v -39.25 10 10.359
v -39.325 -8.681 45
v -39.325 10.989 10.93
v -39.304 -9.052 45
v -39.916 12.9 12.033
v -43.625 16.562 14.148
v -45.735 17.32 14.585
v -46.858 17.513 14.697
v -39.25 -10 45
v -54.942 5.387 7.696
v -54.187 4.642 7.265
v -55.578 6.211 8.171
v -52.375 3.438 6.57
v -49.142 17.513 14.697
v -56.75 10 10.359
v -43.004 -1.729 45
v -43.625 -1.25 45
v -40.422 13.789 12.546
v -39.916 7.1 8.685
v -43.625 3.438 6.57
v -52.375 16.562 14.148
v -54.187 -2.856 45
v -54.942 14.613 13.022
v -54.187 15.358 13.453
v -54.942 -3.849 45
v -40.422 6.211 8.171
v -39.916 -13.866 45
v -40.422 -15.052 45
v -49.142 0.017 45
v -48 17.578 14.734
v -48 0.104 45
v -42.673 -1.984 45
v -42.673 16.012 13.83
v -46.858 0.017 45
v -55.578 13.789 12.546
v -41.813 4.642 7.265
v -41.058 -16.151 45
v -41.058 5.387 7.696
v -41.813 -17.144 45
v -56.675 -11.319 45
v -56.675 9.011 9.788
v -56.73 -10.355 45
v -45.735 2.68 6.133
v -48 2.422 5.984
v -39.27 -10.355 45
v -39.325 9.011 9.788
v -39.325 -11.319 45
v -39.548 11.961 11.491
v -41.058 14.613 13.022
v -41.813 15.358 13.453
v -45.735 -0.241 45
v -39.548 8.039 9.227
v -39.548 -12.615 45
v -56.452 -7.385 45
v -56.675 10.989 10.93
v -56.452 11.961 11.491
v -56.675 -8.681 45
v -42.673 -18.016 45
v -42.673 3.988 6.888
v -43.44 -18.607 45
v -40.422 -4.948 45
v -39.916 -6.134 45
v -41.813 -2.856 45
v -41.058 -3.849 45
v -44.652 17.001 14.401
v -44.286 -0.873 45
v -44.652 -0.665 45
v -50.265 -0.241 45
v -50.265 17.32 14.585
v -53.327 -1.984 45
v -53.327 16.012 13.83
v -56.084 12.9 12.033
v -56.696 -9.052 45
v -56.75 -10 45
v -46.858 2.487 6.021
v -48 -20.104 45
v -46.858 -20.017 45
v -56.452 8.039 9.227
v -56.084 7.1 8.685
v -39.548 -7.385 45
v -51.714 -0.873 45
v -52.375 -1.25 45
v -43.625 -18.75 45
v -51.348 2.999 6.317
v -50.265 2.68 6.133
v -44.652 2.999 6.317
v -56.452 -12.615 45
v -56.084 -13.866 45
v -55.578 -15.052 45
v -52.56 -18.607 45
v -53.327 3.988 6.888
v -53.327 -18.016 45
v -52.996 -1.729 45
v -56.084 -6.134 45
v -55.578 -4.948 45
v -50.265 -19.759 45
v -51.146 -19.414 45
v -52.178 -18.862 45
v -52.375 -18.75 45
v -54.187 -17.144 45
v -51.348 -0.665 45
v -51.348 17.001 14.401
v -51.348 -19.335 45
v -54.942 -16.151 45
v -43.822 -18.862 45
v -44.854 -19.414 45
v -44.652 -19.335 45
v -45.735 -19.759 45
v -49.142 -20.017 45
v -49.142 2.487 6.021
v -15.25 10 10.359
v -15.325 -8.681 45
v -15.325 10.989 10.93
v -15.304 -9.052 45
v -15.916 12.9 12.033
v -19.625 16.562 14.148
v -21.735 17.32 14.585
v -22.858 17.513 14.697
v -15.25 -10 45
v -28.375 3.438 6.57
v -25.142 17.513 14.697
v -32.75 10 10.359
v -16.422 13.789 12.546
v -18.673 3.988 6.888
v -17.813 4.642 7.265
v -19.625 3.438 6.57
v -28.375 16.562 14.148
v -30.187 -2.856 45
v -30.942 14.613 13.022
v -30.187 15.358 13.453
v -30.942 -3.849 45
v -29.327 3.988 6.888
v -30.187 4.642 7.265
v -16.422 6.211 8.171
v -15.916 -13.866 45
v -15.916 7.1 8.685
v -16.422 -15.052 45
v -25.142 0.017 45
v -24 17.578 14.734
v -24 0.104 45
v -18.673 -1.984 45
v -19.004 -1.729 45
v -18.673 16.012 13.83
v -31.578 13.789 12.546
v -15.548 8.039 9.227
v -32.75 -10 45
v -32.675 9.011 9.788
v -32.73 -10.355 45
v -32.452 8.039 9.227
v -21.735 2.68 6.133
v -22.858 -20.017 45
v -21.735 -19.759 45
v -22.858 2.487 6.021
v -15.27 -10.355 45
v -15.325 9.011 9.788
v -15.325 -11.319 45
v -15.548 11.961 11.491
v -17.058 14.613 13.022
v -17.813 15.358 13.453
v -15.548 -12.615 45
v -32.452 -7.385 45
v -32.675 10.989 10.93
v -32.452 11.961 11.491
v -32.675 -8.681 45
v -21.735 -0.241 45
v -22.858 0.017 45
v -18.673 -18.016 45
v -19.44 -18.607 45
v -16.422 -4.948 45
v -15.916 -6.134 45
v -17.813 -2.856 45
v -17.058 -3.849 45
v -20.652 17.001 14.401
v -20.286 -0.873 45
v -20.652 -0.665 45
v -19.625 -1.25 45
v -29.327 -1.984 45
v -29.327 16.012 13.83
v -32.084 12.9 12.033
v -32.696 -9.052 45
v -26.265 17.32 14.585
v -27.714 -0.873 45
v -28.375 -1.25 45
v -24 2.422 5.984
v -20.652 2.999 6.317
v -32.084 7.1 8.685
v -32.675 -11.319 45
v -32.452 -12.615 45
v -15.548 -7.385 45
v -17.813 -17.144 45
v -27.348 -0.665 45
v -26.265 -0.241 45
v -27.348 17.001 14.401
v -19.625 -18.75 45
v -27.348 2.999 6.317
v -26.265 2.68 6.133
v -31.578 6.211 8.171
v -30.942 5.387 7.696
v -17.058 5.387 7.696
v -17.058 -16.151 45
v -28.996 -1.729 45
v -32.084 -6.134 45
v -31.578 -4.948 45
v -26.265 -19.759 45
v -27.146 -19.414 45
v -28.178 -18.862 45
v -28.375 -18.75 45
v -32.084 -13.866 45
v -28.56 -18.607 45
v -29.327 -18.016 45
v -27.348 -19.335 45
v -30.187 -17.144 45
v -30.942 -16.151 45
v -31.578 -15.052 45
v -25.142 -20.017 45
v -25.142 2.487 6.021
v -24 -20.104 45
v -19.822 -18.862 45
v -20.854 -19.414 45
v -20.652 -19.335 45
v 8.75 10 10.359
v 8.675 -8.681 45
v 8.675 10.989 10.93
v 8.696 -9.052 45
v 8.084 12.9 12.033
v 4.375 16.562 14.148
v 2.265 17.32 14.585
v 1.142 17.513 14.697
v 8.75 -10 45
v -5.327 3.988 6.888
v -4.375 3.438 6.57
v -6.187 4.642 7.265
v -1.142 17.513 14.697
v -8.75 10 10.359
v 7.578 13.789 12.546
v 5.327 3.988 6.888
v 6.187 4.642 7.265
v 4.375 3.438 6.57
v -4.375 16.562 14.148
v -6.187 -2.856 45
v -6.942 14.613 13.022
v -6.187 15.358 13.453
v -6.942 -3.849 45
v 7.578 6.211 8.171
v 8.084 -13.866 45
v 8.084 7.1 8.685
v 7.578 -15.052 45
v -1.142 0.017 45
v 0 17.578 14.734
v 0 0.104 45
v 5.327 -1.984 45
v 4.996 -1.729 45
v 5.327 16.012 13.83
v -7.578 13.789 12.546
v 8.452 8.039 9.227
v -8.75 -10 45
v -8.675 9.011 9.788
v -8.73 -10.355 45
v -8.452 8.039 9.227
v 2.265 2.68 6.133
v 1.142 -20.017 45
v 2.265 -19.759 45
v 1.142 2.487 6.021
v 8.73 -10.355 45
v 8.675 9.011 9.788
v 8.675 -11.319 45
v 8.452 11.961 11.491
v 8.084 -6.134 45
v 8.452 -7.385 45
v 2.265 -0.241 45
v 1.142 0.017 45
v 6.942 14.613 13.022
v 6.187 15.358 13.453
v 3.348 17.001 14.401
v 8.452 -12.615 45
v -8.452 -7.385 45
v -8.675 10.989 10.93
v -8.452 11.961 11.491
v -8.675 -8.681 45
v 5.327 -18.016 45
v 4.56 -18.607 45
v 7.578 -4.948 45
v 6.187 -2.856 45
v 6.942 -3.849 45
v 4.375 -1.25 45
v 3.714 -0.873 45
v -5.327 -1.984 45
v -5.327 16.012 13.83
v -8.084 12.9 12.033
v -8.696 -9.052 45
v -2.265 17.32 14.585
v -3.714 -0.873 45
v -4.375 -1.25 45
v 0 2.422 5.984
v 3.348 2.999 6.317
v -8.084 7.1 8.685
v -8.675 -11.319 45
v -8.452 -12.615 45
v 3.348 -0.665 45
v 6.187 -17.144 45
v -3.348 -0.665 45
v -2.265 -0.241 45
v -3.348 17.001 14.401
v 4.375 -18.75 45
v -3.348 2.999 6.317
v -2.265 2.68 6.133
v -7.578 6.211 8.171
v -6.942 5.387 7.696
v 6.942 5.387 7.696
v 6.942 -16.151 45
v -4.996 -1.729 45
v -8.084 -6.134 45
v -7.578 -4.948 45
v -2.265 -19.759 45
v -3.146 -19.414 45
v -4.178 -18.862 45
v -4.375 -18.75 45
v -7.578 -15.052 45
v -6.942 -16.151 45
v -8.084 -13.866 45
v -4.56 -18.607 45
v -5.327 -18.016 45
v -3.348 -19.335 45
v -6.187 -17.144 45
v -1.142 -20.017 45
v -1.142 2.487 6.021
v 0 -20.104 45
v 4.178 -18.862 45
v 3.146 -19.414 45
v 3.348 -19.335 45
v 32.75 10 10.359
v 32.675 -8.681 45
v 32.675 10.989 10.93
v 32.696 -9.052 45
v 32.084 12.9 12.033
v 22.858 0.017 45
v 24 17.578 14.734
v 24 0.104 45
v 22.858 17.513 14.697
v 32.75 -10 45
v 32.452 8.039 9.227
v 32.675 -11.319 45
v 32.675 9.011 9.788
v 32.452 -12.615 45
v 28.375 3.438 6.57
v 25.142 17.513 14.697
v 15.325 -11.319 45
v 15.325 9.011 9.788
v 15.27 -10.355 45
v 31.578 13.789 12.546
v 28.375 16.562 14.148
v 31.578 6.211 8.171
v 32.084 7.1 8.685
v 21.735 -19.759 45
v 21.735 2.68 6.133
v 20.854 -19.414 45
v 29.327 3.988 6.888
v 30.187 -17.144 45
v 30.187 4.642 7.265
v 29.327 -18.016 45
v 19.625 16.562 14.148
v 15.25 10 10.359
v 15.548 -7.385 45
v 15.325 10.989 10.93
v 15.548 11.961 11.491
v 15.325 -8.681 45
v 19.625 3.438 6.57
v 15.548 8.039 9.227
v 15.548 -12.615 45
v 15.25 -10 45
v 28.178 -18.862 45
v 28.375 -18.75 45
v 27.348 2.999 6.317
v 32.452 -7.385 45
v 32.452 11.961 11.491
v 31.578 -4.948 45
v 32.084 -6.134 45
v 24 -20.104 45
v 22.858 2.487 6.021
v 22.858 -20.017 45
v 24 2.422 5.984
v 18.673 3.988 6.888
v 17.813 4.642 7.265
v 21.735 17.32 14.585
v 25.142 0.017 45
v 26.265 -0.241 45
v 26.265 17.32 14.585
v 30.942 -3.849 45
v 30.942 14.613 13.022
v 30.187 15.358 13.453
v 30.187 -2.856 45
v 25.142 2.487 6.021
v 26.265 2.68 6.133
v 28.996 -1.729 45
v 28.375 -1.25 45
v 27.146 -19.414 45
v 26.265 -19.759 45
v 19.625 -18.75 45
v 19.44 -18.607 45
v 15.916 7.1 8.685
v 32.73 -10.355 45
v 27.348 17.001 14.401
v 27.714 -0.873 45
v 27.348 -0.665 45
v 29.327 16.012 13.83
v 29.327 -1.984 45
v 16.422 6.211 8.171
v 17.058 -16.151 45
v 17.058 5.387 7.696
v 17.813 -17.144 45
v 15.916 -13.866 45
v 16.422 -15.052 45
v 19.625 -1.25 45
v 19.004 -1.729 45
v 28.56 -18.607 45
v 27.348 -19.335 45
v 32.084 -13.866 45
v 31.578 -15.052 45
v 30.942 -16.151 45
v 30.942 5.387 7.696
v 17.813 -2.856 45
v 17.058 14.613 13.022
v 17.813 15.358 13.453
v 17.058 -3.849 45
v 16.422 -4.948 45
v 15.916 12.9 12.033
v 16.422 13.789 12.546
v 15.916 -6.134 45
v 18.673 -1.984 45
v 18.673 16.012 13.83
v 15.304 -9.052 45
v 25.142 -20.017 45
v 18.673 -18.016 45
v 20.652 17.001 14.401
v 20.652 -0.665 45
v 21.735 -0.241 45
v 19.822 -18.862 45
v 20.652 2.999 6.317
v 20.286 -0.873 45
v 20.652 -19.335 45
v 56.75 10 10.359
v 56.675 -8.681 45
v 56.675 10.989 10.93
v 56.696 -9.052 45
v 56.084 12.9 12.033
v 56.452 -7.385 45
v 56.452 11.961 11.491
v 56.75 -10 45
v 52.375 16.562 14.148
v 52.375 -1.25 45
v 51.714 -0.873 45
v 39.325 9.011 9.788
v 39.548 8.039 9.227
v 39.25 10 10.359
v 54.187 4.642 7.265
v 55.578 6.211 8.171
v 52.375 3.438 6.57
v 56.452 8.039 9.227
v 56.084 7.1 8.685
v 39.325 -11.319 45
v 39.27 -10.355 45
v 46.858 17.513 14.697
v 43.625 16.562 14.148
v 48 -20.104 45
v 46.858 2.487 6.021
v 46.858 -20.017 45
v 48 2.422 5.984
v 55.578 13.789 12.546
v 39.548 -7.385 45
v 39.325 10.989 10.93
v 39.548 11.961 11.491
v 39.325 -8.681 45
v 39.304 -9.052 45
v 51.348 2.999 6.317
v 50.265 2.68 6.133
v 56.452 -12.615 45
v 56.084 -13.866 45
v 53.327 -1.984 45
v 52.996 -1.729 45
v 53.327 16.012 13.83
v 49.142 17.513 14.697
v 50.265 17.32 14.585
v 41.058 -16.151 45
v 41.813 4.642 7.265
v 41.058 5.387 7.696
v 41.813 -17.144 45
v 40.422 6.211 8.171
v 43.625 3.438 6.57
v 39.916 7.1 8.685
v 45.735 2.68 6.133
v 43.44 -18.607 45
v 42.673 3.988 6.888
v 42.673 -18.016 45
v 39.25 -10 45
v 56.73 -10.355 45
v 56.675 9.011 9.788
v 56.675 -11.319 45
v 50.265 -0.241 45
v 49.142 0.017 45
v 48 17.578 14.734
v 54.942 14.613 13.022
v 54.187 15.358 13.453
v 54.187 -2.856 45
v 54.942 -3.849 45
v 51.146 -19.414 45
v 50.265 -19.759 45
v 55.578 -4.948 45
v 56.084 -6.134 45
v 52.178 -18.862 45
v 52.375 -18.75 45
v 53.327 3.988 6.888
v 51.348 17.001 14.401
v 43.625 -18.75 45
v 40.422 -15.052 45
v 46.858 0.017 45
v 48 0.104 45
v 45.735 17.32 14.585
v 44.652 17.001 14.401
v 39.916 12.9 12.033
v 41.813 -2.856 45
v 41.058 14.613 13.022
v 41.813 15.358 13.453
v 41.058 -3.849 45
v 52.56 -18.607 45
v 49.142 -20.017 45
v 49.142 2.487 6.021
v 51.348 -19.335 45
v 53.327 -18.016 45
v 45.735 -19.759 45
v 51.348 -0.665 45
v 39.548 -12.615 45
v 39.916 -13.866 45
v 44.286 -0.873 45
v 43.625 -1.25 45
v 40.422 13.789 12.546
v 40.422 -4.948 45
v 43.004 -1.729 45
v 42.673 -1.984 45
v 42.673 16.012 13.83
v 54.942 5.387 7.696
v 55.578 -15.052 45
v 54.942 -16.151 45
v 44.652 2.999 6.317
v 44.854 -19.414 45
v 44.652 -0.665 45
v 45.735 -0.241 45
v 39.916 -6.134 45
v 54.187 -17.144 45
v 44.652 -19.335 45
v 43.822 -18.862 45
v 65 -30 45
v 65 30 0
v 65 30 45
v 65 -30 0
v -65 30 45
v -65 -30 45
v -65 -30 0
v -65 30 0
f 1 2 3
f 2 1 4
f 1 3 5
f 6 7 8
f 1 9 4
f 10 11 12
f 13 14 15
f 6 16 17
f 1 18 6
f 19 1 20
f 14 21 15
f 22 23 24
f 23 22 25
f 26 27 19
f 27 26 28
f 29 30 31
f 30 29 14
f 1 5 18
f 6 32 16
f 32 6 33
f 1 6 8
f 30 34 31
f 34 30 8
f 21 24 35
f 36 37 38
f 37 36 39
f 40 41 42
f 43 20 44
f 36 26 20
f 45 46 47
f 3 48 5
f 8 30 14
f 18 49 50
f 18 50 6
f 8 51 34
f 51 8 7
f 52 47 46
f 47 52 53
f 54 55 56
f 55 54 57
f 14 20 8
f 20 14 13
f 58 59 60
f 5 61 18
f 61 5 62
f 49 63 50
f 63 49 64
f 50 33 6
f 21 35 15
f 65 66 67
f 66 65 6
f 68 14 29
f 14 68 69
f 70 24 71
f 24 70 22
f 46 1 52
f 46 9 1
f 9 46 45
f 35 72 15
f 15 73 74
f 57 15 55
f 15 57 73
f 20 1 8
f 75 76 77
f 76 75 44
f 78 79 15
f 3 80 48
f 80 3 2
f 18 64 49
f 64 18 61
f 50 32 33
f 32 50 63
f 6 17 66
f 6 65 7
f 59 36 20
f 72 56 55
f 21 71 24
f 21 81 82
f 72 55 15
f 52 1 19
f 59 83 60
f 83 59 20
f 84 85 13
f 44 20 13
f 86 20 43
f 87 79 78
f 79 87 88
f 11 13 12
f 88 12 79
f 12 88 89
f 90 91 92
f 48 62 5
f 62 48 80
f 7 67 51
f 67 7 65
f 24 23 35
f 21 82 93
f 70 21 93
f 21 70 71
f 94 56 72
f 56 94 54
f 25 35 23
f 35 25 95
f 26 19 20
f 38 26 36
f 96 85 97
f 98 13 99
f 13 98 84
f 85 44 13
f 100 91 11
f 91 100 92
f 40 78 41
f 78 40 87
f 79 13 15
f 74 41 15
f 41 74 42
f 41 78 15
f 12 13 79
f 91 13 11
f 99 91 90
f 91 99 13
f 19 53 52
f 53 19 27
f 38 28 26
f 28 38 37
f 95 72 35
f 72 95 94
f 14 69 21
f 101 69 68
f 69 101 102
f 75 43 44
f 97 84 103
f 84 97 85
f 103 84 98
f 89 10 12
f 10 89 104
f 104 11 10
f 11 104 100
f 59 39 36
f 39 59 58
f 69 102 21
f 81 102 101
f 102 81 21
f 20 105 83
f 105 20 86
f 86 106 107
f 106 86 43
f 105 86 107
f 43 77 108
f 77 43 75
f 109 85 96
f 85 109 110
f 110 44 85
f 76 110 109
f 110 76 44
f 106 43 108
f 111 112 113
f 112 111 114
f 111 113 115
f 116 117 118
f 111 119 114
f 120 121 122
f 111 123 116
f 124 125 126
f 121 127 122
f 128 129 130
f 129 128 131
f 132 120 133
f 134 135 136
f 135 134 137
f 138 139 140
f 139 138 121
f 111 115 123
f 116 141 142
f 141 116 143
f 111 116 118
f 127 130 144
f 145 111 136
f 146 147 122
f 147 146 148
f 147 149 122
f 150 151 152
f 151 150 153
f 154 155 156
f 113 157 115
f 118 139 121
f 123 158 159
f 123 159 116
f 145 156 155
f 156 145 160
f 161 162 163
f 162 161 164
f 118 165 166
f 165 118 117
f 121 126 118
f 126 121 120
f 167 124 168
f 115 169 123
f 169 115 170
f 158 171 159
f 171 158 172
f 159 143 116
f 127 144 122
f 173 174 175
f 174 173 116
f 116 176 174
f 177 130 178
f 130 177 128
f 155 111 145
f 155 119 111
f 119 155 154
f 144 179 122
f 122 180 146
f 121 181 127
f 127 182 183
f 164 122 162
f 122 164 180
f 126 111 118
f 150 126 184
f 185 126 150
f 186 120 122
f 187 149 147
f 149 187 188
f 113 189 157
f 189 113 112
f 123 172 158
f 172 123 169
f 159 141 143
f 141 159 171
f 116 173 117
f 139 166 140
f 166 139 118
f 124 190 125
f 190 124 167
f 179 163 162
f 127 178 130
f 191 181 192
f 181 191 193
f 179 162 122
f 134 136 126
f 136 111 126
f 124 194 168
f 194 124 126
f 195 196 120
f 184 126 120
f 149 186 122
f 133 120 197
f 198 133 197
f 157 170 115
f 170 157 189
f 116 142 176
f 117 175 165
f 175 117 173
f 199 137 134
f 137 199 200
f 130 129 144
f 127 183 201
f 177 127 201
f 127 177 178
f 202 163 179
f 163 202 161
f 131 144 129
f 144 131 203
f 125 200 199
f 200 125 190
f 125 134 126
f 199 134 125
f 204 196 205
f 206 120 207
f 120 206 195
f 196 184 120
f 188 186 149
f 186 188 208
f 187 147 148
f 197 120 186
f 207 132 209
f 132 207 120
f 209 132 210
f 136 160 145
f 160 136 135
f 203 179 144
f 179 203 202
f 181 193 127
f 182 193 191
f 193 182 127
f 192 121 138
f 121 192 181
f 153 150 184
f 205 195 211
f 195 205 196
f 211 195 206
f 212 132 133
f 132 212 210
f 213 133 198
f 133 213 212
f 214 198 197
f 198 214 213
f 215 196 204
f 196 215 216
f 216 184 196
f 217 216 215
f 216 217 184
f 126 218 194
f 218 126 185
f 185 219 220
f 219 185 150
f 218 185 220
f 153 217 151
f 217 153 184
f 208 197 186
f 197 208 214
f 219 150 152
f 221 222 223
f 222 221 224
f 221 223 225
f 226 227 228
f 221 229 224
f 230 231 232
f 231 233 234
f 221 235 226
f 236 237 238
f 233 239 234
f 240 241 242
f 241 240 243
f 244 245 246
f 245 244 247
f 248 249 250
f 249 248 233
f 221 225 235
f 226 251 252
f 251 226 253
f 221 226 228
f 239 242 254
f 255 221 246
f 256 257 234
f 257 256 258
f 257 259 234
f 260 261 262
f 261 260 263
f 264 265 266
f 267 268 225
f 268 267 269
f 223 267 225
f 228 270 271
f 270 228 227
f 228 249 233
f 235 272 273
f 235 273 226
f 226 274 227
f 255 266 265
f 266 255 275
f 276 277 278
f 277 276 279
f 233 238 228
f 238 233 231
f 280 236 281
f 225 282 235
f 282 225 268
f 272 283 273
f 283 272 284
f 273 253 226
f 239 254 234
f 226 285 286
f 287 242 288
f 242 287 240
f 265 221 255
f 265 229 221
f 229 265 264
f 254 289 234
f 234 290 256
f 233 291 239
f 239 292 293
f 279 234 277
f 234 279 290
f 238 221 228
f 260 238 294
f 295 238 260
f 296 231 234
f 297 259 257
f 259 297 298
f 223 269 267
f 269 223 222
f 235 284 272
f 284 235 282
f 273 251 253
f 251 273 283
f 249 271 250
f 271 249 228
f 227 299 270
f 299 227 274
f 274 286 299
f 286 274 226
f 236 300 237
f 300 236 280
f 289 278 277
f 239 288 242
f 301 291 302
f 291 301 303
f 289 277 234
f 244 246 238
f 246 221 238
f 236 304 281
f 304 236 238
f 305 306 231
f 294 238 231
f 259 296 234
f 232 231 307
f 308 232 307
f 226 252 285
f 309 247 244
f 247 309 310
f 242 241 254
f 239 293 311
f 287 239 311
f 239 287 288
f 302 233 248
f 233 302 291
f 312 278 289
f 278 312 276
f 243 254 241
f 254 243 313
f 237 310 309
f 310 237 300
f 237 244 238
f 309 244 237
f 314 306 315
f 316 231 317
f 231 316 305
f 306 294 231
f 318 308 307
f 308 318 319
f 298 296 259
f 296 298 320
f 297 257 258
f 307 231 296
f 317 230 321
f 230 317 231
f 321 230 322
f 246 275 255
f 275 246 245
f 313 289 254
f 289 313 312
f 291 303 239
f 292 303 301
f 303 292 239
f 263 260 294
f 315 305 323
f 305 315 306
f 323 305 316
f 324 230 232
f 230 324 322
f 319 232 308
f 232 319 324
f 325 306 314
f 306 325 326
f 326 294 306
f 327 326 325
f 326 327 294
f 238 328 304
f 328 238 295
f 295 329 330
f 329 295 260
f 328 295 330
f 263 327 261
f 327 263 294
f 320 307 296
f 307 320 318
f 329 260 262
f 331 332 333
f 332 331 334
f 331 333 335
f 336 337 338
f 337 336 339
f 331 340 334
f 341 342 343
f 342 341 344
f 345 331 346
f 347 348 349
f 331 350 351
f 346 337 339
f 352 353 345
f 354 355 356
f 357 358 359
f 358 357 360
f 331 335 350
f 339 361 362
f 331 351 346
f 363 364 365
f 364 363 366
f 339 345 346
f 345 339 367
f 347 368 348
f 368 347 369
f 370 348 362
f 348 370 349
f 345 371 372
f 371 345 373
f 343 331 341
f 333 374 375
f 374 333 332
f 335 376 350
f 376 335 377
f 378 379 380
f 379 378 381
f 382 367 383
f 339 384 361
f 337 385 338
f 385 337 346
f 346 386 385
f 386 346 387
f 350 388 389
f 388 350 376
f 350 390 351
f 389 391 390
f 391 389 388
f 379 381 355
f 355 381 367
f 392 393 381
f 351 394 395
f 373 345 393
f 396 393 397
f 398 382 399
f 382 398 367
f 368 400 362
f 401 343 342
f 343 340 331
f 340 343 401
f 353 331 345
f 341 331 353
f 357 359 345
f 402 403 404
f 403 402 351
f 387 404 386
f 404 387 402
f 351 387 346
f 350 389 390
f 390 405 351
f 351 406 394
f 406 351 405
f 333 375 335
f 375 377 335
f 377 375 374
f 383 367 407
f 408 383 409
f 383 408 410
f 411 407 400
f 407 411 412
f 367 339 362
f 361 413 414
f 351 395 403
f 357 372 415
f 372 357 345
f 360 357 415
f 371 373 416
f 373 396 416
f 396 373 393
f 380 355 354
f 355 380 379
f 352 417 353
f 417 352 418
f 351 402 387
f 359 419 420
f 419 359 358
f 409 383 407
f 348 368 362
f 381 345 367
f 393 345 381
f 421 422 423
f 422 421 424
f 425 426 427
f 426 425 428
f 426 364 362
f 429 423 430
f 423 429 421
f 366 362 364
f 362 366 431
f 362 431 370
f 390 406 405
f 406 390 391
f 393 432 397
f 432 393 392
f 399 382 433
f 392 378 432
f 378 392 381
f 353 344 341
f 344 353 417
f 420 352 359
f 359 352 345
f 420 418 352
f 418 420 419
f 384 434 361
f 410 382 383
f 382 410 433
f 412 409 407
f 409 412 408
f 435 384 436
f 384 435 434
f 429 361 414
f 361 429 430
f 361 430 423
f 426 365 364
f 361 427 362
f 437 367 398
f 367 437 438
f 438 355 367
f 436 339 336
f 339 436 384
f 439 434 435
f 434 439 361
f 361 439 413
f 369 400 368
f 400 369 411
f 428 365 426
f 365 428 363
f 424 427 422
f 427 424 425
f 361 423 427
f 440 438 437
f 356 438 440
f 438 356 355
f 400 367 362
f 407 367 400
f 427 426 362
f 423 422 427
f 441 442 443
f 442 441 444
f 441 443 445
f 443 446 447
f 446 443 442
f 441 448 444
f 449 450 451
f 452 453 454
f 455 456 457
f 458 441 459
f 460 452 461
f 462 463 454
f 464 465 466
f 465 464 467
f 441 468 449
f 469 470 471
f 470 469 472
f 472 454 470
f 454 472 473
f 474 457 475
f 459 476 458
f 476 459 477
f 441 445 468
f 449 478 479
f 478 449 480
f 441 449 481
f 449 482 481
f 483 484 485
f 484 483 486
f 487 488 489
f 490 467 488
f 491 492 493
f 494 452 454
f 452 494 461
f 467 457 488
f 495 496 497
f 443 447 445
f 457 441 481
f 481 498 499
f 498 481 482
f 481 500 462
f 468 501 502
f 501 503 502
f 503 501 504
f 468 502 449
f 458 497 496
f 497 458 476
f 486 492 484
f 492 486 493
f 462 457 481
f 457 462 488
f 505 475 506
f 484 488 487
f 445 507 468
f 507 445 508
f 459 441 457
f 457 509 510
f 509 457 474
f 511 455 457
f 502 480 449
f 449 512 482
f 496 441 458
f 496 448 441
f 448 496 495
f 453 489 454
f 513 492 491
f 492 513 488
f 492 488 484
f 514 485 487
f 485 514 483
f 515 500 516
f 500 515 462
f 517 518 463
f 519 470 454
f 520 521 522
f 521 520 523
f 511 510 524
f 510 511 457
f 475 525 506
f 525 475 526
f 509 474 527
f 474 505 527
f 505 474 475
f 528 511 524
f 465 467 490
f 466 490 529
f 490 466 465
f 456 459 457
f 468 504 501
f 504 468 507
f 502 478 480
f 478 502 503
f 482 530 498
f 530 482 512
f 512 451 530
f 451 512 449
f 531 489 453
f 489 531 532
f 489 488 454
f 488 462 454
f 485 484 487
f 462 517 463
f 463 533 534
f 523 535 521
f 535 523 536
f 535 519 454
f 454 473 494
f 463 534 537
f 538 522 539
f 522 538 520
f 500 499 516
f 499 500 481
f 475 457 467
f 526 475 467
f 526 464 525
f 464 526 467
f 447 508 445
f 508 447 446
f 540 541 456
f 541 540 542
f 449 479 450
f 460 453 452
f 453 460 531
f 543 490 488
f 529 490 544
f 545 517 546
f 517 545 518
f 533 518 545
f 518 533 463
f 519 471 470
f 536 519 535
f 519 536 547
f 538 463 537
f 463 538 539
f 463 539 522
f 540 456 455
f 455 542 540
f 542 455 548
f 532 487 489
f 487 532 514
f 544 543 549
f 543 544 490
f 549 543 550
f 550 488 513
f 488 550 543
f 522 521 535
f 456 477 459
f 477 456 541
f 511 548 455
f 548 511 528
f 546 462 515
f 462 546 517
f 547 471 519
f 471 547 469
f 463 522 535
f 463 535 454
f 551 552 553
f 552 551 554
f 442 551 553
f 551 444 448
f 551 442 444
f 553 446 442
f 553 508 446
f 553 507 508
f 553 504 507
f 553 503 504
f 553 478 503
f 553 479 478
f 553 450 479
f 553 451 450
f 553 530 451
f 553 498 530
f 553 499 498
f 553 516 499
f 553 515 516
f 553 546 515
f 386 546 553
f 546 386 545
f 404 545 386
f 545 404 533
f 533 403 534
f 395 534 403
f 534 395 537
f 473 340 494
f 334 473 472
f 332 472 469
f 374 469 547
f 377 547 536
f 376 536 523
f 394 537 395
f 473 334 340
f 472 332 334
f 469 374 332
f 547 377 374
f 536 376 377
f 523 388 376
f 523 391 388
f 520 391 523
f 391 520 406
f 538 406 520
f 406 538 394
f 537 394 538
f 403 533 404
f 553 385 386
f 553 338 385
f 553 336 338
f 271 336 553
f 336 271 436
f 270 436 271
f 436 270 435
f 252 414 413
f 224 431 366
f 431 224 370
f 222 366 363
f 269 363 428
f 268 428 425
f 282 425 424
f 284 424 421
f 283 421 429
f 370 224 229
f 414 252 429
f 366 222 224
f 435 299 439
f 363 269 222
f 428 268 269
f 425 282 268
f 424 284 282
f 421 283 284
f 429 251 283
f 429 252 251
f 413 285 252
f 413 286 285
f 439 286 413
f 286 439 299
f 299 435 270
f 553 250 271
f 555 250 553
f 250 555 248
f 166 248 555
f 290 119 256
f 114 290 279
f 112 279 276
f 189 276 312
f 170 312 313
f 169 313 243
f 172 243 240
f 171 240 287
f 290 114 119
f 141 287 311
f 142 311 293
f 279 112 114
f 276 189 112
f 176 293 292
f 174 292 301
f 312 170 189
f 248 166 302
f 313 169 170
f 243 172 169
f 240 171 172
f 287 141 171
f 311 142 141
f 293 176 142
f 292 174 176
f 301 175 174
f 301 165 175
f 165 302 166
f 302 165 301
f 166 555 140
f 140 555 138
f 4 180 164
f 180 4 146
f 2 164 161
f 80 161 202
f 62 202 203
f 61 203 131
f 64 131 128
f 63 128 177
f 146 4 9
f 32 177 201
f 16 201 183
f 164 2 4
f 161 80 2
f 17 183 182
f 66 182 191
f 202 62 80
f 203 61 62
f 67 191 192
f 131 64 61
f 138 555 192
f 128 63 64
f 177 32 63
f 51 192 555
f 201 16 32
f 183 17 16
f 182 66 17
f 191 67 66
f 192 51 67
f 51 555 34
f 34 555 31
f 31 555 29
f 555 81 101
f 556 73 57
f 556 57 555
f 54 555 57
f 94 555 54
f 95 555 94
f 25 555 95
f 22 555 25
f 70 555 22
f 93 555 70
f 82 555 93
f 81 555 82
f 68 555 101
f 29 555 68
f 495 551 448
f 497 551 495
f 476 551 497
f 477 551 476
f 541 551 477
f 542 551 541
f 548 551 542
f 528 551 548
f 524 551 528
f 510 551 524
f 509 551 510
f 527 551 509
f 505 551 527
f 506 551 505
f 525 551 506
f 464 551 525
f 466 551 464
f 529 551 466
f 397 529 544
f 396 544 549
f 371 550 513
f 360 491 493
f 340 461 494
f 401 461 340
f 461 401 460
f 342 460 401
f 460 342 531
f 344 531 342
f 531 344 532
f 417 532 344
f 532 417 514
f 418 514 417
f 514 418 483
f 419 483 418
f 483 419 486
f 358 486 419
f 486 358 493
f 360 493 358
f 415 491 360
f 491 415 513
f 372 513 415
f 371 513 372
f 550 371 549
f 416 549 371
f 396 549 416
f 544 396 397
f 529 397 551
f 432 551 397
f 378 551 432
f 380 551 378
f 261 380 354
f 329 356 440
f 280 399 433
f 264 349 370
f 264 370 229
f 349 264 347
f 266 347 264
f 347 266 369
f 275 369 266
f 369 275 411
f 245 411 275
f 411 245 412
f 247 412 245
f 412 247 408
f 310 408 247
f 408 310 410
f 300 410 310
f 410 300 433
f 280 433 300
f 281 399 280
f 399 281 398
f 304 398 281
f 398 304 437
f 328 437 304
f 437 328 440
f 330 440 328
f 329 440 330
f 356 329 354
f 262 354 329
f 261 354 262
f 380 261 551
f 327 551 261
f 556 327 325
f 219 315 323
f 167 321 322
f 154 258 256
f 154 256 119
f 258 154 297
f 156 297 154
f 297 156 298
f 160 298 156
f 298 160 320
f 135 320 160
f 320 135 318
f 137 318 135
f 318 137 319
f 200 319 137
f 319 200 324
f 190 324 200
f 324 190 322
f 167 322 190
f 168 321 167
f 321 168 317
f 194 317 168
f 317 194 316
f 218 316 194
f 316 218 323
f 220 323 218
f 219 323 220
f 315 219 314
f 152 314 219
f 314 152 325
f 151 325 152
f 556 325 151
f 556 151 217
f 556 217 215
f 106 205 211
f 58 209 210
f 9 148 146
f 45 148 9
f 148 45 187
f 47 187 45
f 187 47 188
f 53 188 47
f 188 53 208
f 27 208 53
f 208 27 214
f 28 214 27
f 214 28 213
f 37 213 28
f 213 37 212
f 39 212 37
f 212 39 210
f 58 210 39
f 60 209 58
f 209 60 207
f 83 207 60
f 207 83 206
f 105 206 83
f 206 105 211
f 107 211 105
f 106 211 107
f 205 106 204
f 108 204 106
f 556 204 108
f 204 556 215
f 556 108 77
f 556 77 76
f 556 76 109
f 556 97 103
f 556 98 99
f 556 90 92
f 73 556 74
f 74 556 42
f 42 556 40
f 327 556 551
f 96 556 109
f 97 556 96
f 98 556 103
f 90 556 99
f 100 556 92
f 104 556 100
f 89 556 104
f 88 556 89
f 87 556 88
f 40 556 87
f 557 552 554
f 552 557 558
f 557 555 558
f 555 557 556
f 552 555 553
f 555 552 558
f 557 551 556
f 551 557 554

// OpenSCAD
// KNOWN-RIGHT ALTERNATIVE (must pass): a correct rack whose tilted holes use $fn = 48
// Rack that holds five 15 mL conical tubes at a 30-degree lean (reading volumes, pipetting off
// supernatant). Category: benchware. A solid block with five blind holes tilted 30 degrees from
// vertical; the hole roofs overhang at 60 degrees from horizontal, so it prints without supports.
// Print: PLA or PETG, standing on the bed, 0.2 mm layers, 15 % infill.
// SPDX-License-Identifier: CERN-OHL-P-2.0

/* [Rack] */
block = [130, 60, 45];    // X, Y, Z [mm], centred in X and Y
n = 5;
pitch = 24;               // along X
hole_d = 17.5;            // square to the axis
tilt = 30;                // degrees from vertical; going down, the hole moves toward +Y
entry_y = -10;            // the axis meets the top face at y = -10
depth = 40;               // along the axis, flat end square to the axis

/* [Hidden] */
eps = 0.01;

difference() {
    translate([-block.x / 2, -block.y / 2, 0]) cube(block);
    for (i = [0 : n - 1])
        translate([(i - (n - 1) / 2) * pitch, entry_y, block.z])
            rotate([tilt, 0, 0])            // local +Z (up the hole) -> (0, -sin, cos)
                translate([0, 0, -depth]) cylinder(d = hole_d, h = depth + 15, $fn = 48);
}
